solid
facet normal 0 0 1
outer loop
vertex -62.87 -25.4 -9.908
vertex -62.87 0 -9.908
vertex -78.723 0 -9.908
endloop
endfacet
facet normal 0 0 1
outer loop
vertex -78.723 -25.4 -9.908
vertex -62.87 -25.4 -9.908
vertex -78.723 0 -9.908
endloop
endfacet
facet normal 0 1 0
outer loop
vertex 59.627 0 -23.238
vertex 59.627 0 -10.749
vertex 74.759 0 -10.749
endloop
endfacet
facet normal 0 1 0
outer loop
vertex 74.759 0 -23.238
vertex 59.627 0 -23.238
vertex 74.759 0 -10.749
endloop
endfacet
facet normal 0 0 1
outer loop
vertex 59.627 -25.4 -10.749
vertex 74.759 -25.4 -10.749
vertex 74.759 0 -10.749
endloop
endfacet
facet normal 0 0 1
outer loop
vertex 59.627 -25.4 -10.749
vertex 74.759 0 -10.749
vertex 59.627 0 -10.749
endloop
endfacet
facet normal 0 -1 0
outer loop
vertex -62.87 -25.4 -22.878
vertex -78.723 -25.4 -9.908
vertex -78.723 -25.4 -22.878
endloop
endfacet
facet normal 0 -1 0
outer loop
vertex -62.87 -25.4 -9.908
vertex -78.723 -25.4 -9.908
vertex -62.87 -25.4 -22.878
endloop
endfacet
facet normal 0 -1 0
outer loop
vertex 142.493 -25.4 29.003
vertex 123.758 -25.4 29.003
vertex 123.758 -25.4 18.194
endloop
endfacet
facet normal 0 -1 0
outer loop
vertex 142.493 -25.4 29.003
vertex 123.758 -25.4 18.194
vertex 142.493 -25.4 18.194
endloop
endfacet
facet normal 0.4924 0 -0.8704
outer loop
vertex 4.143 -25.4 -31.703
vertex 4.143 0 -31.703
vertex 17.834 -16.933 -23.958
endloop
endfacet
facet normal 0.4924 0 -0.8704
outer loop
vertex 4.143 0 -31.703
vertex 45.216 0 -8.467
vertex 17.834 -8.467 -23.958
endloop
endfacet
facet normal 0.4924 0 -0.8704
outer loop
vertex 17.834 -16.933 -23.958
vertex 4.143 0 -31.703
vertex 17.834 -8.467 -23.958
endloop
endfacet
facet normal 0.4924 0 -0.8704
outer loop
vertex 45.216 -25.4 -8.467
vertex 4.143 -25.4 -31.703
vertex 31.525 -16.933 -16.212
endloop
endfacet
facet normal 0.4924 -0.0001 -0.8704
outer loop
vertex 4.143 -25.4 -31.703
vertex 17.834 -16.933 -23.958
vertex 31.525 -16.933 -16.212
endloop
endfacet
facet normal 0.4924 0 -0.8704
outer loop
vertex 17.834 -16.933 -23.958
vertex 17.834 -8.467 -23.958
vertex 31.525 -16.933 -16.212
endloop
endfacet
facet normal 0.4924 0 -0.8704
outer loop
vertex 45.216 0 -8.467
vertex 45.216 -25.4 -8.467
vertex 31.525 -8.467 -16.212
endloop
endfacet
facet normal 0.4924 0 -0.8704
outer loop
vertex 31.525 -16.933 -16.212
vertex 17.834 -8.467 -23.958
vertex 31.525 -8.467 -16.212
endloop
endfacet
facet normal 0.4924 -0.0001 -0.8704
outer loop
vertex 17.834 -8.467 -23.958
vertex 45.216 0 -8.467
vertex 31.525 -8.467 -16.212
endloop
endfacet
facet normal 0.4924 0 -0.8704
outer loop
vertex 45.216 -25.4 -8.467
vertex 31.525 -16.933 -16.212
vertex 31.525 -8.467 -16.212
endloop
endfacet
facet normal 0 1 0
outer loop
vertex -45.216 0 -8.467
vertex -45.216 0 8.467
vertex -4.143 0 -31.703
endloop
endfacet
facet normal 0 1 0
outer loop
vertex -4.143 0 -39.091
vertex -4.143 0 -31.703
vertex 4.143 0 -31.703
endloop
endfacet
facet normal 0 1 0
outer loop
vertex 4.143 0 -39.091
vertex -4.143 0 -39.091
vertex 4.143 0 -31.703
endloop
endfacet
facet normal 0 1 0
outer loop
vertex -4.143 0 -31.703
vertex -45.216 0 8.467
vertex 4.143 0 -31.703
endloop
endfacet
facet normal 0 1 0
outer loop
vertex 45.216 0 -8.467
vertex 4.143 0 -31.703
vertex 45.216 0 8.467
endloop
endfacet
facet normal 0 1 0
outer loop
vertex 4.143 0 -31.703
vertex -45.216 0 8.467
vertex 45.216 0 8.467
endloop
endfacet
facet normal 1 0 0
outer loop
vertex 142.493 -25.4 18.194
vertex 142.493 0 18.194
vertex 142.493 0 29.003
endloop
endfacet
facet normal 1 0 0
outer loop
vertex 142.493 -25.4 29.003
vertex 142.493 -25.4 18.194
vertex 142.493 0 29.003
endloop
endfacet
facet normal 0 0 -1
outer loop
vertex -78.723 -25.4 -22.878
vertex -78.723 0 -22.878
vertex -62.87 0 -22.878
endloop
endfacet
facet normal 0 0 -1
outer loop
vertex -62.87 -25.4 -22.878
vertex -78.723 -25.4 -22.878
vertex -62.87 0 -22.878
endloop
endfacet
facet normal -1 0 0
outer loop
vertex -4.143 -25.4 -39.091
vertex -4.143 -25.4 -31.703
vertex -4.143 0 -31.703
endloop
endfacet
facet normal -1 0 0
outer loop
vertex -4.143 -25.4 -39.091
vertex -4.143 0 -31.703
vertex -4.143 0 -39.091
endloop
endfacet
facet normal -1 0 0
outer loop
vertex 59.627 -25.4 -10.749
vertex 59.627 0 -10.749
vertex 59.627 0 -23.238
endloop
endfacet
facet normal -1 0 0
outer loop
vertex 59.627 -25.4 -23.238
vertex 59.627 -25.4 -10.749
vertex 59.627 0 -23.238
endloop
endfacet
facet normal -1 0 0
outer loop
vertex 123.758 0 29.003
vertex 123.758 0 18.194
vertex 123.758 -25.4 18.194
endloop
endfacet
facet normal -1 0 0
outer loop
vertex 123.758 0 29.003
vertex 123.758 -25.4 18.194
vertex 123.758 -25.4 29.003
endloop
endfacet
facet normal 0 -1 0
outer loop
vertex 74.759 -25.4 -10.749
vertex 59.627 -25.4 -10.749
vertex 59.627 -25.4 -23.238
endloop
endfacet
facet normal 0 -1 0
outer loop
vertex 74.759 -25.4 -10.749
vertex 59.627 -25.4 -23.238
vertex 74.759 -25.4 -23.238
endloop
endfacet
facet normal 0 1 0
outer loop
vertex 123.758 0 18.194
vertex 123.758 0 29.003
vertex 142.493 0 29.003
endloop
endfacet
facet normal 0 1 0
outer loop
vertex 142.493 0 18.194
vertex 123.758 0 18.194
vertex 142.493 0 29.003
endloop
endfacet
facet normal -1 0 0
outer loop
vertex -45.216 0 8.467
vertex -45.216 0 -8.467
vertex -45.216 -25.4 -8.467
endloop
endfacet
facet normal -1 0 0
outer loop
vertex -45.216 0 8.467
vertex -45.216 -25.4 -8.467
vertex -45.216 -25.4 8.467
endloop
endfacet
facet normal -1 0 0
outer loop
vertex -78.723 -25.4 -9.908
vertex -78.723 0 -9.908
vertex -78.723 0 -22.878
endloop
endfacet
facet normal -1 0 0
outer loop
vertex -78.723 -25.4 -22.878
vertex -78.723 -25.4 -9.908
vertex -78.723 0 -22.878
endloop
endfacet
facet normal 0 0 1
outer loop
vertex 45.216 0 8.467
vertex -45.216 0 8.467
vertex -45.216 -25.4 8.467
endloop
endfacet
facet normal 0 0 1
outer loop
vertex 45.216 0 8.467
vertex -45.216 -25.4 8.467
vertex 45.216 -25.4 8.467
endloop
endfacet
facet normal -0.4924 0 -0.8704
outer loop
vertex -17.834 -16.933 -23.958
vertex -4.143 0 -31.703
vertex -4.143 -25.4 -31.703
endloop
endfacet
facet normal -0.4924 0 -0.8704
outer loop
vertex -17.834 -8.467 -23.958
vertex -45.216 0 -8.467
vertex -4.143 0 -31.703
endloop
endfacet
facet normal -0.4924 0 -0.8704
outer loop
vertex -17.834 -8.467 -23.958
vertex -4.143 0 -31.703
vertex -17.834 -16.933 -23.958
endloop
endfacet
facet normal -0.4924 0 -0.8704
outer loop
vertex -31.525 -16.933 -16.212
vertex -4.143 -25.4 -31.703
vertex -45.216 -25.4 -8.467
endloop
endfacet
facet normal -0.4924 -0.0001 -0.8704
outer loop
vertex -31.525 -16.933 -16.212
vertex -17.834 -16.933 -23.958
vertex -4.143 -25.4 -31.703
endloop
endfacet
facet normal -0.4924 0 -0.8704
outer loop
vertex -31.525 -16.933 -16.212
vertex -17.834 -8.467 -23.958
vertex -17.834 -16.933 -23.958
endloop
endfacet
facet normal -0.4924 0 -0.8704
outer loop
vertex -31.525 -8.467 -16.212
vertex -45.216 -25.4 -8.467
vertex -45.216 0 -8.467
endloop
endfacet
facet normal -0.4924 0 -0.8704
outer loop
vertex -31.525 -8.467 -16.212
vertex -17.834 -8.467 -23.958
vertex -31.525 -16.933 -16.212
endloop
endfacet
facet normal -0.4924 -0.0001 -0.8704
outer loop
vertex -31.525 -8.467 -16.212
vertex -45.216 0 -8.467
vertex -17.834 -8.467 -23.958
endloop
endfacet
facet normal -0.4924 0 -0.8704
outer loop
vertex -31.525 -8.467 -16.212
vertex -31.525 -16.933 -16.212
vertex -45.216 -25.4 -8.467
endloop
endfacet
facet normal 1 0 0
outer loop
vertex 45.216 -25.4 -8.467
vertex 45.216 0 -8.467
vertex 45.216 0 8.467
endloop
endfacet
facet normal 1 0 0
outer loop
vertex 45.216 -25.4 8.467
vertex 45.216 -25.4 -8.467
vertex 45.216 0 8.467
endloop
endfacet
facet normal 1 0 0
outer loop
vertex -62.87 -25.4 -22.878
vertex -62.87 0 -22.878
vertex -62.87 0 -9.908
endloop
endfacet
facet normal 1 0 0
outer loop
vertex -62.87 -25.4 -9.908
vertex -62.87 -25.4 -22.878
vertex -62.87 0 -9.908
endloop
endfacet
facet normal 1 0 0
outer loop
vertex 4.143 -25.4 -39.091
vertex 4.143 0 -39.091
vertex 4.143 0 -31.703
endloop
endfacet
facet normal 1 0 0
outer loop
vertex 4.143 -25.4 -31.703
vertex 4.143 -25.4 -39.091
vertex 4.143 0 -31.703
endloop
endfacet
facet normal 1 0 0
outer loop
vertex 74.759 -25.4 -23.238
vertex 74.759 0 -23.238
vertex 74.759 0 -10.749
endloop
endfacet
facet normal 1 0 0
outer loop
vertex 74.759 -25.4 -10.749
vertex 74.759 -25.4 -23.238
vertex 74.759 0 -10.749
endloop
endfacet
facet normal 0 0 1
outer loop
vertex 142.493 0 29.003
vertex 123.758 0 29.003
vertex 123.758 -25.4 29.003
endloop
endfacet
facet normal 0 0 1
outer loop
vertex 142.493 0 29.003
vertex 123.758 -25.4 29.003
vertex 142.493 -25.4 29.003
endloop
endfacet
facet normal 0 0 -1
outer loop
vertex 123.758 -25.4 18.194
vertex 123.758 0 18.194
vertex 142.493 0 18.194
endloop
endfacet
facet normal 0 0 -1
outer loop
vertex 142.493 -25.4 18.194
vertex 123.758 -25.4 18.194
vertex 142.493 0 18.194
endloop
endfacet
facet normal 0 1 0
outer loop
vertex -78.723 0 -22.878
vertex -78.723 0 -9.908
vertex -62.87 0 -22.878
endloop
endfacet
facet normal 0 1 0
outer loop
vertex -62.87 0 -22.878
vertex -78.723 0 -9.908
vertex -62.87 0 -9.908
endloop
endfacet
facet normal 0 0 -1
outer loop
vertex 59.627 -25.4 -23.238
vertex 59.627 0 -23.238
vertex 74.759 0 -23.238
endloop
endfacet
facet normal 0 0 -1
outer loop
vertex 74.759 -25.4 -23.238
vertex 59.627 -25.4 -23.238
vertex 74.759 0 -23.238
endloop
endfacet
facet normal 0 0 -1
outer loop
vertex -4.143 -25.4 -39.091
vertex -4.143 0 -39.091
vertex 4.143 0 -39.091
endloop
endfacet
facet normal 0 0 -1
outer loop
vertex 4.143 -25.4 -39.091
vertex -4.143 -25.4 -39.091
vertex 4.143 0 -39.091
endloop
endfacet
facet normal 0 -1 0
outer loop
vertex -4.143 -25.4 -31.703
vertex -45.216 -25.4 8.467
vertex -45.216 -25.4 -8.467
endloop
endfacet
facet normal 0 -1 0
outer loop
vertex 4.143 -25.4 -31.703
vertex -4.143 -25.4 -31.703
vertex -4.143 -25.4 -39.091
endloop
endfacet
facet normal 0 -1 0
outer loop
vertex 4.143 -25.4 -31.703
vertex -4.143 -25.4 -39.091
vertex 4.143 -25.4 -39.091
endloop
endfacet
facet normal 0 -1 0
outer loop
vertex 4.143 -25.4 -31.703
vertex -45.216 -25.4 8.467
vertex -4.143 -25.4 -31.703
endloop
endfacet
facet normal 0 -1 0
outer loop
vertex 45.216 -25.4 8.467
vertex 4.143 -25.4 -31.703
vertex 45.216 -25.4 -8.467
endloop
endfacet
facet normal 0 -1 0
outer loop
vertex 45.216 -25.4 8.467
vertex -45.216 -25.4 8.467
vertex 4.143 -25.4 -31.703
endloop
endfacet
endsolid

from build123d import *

# Parameters (mm, degrees)
F0_W     = 90.4318988323
F0_H     = 16.9334691018
F1_DEPTH = 25.4
F0_W_2   = 18.7349021435
F0_H_2   = 10.8085945249


with BuildPart() as f1:
    # F0 (on Front) → F1 (new body)
    with BuildSketch(Plane.XZ):
        with BuildLine():
            add(Edge.make_bspline(
                [(4.1432967409, -31.7030579362), (17.834180966, -23.9576168077), (31.5250651911, -16.2121756793), (45.2159494162, -8.4667345509)],
                knots=[4.7603909586, 4.7603909586, 4.7603909586, 4.7603909586, 51.9503212642, 51.9503212642, 51.9503212642, 51.9503212642], degree=3))
            Line((45.2159494162, -8.4667345509), (-45.2159494162, -8.4667345509))
            add(Edge.make_bspline(
                [(-4.1432967409, -31.7030579362), (-17.834180966, -23.9576168077), (-31.5250651911, -16.2121756793), (-45.2159494162, -8.4667345509)],
                knots=[4.7603909586, 4.7603909586, 4.7603909586, 4.7603909586, 51.9503212642, 51.9503212642, 51.9503212642, 51.9503212642], degree=3))
            Line((-4.1432967409, -31.7030579362), (-4.1432967409, -29.0030632168))
            Line((-4.1432967409, -29.0030632168), (4.1432967409, -29.0030632168))
            Line((4.1432967409, -29.0030632168), (4.1432967409, -31.7030579362))
        make_face()
        Rectangle(F0_W, F0_H)
        with BuildLine():
            add(Edge.make_bspline(
                [(0, -34.047074616), (1.3810989136, -33.2657357227), (2.7621978273, -32.4843968294), (4.1432967409, -31.7030579362)],
                knots=[0, 0, 0, 0, 4.7603909586, 4.7603909586, 4.7603909586, 4.7603909586], degree=3))
            Line((4.1432967409, -31.7030579362), (4.1432967409, -29.0030632168))
            Line((4.1432967409, -29.0030632168), (-4.1432967409, -29.0030632168))
            Line((-4.1432967409, -29.0030632168), (-4.1432967409, -31.7030579362))
            add(Edge.make_bspline(
                [(0, -34.047074616), (-1.3810989136, -33.2657357227), (-2.7621978273, -32.4843968294), (-4.1432967409, -31.7030579362)],
                knots=[0, 0, 0, 0, 4.7603909586, 4.7603909586, 4.7603909586, 4.7603909586], degree=3))
        make_face()
        with BuildLine():
            Line((4.1432967409, -39.0910860151), (4.1432967409, -31.7030579362))
            add(Edge.make_bspline(
                [(0, -34.047074616), (1.3810989136, -33.2657357227), (2.7621978273, -32.4843968294), (4.1432967409, -31.7030579362)],
                knots=[0, 0, 0, 0, 4.7603909586, 4.7603909586, 4.7603909586, 4.7603909586], degree=3))
            add(Edge.make_bspline(
                [(0, -34.047074616), (-1.3810989136, -33.2657357227), (-2.7621978273, -32.4843968294), (-4.1432967409, -31.7030579362)],
                knots=[0, 0, 0, 0, 4.7603909586, 4.7603909586, 4.7603909586, 4.7603909586], degree=3))
            Line((-4.1432967409, -31.7030579362), (-4.1432967409, -39.0910860151))
            Line((-4.1432967409, -39.0910860151), (4.1432967409, -39.0910860151))
        make_face()
    extrude(amount=F1_DEPTH)


with BuildPart() as f1b:
    # F0 (on Front) → F1, piece 2 (new body)
    with BuildSketch(Plane.XZ):
        with BuildLine():
            Line((-62.8699883819, -22.8781923652), (-62.8699883819, -18.4126714079))
            add(Edge.make_bspline(
                [(-62.8699883819, -18.4126714079), (-65.5120884379, -19.9011783937), (-68.1541884939, -21.3896853794), (-70.7962885499, -22.8781923652)],
                knots=[20.2629403534, 20.2629403534, 20.2629403534, 20.2629403534, 29.3605835523, 29.3605835523, 29.3605835523, 29.3605835523], degree=3))
            Line((-70.7962885499, -22.8781923652), (-62.8699883819, -22.8781923652))
        make_face()
        with BuildLine():
            add(Edge.make_bspline(
                [(-62.8699883819, -18.4126714079), (-65.5120884379, -19.9011783937), (-68.1541884939, -21.3896853794), (-70.7962885499, -22.8781923652)],
                knots=[20.2629403534, 20.2629403534, 20.2629403534, 20.2629403534, 29.3605835523, 29.3605835523, 29.3605835523, 29.3605835523], degree=3))
            Line((-62.8699883819, -18.4126714079), (-62.8699883819, -9.9078826606))
            Line((-62.8699883819, -9.9078826606), (-78.7225887179, -9.9078826606))
            Line((-78.7225887179, -9.9078826606), (-78.7225887179, -22.8781923652))
            Line((-78.7225887179, -22.8781923652), (-70.7962885499, -22.8781923652))
        make_face()
    extrude(amount=F1_DEPTH)


with BuildPart() as f1c:
    # F0 (on Front) → F1, piece 3 (new body)
    with BuildSketch(Plane.XZ):
        with BuildLine():
            Line((59.6274062991, -10.7485509167), (59.6274062991, -18.1531183473))
            add(Edge.make_bspline(
                [(59.6274062991, -18.1531183473), (62.1494154135, -19.8482383077), (64.671424528, -21.5433582681), (67.1934336424, -23.2384782284)],
                knots=[17.3642195489, 17.3642195489, 17.3642195489, 17.3642195489, 26.4804498487, 26.4804498487, 26.4804498487, 26.4804498487], degree=3))
            Line((67.1934336424, -23.2384782284), (74.7594609857, -23.2384782284))
            Line((74.7594609857, -23.2384782284), (74.7594609857, -10.7485509167))
            Line((74.7594609857, -10.7485509167), (59.6274062991, -10.7485509167))
        make_face()
        with BuildLine():
            add(Edge.make_bspline(
                [(59.6274062991, -18.1531183473), (62.1494154135, -19.8482383077), (64.671424528, -21.5433582681), (67.1934336424, -23.2384782284)],
                knots=[17.3642195489, 17.3642195489, 17.3642195489, 17.3642195489, 26.4804498487, 26.4804498487, 26.4804498487, 26.4804498487], degree=3))
            Line((59.6274062991, -18.1531183473), (59.6274062991, -23.2384782284))
            Line((59.6274062991, -23.2384782284), (67.1934336424, -23.2384782284))
        make_face()
    extrude(amount=F1_DEPTH)


with BuildPart() as f1d:
    # F0 (on Front) → F1, piece 4 (new body)
    with BuildSketch(Plane.XZ):
        with Locations((133.1258565187, 23.5987603664)):
            Rectangle(F0_W_2, F0_H_2)
    extrude(amount=F1_DEPTH)


solid = Compound([f1.part, f1b.part, f1c.part, f1d.part])
